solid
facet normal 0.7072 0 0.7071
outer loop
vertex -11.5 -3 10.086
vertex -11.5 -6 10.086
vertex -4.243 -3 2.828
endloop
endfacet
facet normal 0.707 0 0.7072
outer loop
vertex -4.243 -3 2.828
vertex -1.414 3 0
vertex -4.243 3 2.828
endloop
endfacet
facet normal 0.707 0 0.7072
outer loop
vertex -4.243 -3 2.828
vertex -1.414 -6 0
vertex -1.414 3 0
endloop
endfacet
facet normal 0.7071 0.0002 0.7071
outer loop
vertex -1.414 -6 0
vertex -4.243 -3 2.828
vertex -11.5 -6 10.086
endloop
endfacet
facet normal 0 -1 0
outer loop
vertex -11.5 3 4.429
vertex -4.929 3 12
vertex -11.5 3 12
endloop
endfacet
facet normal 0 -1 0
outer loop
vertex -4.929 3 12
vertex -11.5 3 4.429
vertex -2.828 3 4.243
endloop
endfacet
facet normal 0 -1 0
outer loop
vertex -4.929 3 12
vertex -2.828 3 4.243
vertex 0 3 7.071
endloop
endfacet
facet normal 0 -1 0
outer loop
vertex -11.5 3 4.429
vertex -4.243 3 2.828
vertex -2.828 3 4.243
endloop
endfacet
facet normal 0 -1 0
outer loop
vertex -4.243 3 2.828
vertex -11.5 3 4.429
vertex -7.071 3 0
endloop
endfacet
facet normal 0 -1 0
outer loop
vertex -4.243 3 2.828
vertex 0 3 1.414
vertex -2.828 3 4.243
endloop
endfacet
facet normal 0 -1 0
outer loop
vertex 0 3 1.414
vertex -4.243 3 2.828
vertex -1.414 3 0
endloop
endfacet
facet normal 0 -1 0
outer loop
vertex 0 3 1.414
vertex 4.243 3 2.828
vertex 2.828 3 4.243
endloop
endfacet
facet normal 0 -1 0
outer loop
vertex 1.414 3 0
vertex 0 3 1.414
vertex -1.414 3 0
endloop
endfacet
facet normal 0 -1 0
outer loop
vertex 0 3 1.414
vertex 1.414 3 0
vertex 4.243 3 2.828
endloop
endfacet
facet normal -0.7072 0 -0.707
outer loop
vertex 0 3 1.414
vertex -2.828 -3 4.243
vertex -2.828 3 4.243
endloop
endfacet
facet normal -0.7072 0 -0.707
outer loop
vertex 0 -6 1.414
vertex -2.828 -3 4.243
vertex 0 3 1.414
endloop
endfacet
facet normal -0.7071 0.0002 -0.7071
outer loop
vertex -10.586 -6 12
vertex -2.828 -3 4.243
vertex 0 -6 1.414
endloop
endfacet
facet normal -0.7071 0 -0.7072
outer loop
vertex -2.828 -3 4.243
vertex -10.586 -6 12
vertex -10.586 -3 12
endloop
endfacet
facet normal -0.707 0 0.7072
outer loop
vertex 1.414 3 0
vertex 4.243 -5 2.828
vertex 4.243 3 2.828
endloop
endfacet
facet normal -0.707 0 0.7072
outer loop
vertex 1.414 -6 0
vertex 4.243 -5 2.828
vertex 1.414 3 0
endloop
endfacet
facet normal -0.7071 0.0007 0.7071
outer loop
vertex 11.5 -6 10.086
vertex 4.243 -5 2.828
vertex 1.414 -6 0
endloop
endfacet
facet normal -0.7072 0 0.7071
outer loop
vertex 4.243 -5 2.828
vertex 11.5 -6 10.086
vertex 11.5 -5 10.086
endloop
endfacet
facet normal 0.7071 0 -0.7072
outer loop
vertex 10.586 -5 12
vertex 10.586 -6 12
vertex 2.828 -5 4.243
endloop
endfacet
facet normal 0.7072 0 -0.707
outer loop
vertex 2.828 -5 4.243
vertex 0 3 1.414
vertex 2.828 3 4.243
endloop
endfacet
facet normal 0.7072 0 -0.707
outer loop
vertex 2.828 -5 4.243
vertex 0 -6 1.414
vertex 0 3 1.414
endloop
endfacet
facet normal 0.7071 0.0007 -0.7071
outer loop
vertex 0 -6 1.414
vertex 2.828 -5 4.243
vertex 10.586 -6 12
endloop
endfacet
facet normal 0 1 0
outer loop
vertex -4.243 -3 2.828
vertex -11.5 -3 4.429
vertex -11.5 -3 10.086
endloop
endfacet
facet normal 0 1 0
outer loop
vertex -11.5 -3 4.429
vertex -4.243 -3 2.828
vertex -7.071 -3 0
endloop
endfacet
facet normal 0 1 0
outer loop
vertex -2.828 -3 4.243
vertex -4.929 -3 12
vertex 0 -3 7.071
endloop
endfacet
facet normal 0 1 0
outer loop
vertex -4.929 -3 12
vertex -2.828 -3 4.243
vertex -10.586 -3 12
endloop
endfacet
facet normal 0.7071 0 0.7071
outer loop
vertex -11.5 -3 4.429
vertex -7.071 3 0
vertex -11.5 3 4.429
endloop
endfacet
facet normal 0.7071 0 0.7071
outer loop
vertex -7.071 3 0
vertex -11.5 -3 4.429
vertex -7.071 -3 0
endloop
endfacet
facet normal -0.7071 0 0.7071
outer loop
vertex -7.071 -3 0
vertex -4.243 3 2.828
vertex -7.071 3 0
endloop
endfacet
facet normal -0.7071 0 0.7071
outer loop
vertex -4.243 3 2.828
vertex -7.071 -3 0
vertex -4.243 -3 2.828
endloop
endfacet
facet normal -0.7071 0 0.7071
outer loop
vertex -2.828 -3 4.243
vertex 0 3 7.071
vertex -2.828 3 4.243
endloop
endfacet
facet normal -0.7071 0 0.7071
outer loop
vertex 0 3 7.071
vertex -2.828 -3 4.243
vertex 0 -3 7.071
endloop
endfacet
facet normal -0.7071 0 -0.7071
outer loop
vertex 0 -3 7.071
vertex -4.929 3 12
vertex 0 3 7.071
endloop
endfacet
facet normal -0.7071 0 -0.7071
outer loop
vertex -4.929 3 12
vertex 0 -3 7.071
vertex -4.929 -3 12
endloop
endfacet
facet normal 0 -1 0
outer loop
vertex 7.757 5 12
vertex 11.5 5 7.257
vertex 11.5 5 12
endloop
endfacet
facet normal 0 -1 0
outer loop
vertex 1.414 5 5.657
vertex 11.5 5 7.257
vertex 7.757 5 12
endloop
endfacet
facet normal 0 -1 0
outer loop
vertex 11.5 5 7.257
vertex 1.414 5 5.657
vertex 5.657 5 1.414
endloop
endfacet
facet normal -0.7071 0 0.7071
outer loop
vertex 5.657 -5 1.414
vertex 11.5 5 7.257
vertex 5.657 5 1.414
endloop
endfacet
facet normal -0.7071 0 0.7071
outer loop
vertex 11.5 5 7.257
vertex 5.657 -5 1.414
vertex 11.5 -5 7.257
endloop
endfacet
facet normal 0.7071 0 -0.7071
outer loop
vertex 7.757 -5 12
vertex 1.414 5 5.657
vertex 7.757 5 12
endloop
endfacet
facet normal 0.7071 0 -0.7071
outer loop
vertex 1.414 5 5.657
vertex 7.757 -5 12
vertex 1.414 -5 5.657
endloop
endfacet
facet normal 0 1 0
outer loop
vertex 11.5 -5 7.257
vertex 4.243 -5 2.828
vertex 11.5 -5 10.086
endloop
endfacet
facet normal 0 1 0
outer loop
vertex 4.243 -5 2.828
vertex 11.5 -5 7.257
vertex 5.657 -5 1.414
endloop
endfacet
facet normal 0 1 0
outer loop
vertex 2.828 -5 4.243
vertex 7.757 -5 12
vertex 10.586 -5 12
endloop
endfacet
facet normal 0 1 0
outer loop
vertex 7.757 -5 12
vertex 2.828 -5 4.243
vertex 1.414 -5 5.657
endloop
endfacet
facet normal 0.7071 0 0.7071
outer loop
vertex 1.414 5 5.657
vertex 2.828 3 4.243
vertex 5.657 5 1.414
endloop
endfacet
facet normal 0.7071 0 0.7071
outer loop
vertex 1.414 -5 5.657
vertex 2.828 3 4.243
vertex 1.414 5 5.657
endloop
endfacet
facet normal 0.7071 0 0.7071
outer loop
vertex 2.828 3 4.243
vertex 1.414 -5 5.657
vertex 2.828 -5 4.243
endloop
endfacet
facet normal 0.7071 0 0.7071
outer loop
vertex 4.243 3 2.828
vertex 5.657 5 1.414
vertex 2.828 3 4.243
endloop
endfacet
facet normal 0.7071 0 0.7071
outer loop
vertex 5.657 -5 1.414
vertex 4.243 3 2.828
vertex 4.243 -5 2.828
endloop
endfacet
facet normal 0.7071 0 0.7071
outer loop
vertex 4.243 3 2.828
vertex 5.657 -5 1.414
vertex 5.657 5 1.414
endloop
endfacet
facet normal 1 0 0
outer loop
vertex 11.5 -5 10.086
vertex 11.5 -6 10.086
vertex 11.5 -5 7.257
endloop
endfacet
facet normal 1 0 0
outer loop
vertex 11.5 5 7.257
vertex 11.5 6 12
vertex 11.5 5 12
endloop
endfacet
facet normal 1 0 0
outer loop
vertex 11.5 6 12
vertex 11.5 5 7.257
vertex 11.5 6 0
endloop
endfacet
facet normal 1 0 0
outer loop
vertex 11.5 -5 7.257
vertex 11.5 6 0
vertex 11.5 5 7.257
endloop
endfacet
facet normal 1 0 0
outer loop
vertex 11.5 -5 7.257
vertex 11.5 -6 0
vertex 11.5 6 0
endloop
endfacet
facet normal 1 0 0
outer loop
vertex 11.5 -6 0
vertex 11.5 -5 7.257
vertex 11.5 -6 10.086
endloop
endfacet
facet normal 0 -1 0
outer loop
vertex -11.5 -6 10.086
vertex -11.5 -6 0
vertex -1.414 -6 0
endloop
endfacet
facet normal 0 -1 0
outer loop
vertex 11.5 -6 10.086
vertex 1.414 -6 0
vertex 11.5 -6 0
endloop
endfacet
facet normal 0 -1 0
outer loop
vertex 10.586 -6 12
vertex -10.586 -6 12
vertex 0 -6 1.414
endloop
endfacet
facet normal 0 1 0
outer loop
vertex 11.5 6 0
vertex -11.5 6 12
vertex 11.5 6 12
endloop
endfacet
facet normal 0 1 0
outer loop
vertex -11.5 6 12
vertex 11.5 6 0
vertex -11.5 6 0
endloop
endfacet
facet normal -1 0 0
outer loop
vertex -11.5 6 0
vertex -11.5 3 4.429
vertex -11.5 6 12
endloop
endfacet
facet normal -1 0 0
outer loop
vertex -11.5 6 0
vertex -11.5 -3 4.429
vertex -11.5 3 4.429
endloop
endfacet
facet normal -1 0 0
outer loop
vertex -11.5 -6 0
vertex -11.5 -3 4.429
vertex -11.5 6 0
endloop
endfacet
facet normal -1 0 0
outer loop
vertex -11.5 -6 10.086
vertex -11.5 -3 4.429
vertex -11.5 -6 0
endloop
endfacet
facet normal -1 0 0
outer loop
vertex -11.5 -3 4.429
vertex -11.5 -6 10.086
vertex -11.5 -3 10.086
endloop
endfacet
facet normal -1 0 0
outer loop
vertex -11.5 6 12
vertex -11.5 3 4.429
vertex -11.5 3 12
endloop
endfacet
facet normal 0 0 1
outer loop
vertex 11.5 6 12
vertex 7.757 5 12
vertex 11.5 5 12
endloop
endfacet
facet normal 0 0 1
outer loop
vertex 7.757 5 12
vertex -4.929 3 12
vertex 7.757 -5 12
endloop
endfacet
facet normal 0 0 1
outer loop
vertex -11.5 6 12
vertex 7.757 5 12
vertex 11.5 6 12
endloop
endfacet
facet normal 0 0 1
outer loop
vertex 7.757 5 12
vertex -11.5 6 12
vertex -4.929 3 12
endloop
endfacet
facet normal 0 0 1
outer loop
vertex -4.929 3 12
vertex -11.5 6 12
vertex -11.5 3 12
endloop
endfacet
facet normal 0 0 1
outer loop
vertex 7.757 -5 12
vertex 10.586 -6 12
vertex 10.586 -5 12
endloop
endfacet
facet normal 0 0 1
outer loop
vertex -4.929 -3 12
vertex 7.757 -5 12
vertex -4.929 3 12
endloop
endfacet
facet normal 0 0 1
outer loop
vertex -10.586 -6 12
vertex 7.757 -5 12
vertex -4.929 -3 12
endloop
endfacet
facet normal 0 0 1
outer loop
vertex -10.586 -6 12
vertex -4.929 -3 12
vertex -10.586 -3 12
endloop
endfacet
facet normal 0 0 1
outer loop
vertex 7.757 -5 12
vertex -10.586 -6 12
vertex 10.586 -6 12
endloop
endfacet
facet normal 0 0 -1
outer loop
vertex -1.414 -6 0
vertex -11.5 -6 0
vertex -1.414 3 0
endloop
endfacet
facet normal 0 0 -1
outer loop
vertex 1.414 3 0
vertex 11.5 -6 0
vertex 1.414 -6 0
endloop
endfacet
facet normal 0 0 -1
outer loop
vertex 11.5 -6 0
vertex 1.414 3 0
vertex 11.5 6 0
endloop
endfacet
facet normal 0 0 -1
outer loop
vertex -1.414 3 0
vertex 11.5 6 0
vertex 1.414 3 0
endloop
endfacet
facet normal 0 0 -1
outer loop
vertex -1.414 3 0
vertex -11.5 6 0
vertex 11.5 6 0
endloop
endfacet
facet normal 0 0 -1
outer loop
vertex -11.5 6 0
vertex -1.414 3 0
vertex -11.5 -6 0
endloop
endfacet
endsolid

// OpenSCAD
antenna_pair_mount();

module frsky_2_4ghz_antenna()
{
    translate([0,25,0]) cube([10,50,6],true);
}

module antenna_pair()
{
    rotate([0,0,45]) translate([0,5,0]) frsky_2_4ghz_antenna();
    rotate([0,90,-45]) translate([0,5,0]) frsky_2_4ghz_antenna();
}

module cable_clearance()
{
    rotate([0,0,45]) translate([0,25,0]) cube([2,50,10],true);
    rotate([0,0,-45]) translate([0,25,0]) cube([2,50,10],true);
}

module antenna_pair_mount()
{
    rotate([90,0,0])
    difference()
    {
        translate([0,6,0]) cube([23,12,12],true);
        #translate([0,0,2]) cable_clearance();
        #antenna_pair();
    }
    
}
